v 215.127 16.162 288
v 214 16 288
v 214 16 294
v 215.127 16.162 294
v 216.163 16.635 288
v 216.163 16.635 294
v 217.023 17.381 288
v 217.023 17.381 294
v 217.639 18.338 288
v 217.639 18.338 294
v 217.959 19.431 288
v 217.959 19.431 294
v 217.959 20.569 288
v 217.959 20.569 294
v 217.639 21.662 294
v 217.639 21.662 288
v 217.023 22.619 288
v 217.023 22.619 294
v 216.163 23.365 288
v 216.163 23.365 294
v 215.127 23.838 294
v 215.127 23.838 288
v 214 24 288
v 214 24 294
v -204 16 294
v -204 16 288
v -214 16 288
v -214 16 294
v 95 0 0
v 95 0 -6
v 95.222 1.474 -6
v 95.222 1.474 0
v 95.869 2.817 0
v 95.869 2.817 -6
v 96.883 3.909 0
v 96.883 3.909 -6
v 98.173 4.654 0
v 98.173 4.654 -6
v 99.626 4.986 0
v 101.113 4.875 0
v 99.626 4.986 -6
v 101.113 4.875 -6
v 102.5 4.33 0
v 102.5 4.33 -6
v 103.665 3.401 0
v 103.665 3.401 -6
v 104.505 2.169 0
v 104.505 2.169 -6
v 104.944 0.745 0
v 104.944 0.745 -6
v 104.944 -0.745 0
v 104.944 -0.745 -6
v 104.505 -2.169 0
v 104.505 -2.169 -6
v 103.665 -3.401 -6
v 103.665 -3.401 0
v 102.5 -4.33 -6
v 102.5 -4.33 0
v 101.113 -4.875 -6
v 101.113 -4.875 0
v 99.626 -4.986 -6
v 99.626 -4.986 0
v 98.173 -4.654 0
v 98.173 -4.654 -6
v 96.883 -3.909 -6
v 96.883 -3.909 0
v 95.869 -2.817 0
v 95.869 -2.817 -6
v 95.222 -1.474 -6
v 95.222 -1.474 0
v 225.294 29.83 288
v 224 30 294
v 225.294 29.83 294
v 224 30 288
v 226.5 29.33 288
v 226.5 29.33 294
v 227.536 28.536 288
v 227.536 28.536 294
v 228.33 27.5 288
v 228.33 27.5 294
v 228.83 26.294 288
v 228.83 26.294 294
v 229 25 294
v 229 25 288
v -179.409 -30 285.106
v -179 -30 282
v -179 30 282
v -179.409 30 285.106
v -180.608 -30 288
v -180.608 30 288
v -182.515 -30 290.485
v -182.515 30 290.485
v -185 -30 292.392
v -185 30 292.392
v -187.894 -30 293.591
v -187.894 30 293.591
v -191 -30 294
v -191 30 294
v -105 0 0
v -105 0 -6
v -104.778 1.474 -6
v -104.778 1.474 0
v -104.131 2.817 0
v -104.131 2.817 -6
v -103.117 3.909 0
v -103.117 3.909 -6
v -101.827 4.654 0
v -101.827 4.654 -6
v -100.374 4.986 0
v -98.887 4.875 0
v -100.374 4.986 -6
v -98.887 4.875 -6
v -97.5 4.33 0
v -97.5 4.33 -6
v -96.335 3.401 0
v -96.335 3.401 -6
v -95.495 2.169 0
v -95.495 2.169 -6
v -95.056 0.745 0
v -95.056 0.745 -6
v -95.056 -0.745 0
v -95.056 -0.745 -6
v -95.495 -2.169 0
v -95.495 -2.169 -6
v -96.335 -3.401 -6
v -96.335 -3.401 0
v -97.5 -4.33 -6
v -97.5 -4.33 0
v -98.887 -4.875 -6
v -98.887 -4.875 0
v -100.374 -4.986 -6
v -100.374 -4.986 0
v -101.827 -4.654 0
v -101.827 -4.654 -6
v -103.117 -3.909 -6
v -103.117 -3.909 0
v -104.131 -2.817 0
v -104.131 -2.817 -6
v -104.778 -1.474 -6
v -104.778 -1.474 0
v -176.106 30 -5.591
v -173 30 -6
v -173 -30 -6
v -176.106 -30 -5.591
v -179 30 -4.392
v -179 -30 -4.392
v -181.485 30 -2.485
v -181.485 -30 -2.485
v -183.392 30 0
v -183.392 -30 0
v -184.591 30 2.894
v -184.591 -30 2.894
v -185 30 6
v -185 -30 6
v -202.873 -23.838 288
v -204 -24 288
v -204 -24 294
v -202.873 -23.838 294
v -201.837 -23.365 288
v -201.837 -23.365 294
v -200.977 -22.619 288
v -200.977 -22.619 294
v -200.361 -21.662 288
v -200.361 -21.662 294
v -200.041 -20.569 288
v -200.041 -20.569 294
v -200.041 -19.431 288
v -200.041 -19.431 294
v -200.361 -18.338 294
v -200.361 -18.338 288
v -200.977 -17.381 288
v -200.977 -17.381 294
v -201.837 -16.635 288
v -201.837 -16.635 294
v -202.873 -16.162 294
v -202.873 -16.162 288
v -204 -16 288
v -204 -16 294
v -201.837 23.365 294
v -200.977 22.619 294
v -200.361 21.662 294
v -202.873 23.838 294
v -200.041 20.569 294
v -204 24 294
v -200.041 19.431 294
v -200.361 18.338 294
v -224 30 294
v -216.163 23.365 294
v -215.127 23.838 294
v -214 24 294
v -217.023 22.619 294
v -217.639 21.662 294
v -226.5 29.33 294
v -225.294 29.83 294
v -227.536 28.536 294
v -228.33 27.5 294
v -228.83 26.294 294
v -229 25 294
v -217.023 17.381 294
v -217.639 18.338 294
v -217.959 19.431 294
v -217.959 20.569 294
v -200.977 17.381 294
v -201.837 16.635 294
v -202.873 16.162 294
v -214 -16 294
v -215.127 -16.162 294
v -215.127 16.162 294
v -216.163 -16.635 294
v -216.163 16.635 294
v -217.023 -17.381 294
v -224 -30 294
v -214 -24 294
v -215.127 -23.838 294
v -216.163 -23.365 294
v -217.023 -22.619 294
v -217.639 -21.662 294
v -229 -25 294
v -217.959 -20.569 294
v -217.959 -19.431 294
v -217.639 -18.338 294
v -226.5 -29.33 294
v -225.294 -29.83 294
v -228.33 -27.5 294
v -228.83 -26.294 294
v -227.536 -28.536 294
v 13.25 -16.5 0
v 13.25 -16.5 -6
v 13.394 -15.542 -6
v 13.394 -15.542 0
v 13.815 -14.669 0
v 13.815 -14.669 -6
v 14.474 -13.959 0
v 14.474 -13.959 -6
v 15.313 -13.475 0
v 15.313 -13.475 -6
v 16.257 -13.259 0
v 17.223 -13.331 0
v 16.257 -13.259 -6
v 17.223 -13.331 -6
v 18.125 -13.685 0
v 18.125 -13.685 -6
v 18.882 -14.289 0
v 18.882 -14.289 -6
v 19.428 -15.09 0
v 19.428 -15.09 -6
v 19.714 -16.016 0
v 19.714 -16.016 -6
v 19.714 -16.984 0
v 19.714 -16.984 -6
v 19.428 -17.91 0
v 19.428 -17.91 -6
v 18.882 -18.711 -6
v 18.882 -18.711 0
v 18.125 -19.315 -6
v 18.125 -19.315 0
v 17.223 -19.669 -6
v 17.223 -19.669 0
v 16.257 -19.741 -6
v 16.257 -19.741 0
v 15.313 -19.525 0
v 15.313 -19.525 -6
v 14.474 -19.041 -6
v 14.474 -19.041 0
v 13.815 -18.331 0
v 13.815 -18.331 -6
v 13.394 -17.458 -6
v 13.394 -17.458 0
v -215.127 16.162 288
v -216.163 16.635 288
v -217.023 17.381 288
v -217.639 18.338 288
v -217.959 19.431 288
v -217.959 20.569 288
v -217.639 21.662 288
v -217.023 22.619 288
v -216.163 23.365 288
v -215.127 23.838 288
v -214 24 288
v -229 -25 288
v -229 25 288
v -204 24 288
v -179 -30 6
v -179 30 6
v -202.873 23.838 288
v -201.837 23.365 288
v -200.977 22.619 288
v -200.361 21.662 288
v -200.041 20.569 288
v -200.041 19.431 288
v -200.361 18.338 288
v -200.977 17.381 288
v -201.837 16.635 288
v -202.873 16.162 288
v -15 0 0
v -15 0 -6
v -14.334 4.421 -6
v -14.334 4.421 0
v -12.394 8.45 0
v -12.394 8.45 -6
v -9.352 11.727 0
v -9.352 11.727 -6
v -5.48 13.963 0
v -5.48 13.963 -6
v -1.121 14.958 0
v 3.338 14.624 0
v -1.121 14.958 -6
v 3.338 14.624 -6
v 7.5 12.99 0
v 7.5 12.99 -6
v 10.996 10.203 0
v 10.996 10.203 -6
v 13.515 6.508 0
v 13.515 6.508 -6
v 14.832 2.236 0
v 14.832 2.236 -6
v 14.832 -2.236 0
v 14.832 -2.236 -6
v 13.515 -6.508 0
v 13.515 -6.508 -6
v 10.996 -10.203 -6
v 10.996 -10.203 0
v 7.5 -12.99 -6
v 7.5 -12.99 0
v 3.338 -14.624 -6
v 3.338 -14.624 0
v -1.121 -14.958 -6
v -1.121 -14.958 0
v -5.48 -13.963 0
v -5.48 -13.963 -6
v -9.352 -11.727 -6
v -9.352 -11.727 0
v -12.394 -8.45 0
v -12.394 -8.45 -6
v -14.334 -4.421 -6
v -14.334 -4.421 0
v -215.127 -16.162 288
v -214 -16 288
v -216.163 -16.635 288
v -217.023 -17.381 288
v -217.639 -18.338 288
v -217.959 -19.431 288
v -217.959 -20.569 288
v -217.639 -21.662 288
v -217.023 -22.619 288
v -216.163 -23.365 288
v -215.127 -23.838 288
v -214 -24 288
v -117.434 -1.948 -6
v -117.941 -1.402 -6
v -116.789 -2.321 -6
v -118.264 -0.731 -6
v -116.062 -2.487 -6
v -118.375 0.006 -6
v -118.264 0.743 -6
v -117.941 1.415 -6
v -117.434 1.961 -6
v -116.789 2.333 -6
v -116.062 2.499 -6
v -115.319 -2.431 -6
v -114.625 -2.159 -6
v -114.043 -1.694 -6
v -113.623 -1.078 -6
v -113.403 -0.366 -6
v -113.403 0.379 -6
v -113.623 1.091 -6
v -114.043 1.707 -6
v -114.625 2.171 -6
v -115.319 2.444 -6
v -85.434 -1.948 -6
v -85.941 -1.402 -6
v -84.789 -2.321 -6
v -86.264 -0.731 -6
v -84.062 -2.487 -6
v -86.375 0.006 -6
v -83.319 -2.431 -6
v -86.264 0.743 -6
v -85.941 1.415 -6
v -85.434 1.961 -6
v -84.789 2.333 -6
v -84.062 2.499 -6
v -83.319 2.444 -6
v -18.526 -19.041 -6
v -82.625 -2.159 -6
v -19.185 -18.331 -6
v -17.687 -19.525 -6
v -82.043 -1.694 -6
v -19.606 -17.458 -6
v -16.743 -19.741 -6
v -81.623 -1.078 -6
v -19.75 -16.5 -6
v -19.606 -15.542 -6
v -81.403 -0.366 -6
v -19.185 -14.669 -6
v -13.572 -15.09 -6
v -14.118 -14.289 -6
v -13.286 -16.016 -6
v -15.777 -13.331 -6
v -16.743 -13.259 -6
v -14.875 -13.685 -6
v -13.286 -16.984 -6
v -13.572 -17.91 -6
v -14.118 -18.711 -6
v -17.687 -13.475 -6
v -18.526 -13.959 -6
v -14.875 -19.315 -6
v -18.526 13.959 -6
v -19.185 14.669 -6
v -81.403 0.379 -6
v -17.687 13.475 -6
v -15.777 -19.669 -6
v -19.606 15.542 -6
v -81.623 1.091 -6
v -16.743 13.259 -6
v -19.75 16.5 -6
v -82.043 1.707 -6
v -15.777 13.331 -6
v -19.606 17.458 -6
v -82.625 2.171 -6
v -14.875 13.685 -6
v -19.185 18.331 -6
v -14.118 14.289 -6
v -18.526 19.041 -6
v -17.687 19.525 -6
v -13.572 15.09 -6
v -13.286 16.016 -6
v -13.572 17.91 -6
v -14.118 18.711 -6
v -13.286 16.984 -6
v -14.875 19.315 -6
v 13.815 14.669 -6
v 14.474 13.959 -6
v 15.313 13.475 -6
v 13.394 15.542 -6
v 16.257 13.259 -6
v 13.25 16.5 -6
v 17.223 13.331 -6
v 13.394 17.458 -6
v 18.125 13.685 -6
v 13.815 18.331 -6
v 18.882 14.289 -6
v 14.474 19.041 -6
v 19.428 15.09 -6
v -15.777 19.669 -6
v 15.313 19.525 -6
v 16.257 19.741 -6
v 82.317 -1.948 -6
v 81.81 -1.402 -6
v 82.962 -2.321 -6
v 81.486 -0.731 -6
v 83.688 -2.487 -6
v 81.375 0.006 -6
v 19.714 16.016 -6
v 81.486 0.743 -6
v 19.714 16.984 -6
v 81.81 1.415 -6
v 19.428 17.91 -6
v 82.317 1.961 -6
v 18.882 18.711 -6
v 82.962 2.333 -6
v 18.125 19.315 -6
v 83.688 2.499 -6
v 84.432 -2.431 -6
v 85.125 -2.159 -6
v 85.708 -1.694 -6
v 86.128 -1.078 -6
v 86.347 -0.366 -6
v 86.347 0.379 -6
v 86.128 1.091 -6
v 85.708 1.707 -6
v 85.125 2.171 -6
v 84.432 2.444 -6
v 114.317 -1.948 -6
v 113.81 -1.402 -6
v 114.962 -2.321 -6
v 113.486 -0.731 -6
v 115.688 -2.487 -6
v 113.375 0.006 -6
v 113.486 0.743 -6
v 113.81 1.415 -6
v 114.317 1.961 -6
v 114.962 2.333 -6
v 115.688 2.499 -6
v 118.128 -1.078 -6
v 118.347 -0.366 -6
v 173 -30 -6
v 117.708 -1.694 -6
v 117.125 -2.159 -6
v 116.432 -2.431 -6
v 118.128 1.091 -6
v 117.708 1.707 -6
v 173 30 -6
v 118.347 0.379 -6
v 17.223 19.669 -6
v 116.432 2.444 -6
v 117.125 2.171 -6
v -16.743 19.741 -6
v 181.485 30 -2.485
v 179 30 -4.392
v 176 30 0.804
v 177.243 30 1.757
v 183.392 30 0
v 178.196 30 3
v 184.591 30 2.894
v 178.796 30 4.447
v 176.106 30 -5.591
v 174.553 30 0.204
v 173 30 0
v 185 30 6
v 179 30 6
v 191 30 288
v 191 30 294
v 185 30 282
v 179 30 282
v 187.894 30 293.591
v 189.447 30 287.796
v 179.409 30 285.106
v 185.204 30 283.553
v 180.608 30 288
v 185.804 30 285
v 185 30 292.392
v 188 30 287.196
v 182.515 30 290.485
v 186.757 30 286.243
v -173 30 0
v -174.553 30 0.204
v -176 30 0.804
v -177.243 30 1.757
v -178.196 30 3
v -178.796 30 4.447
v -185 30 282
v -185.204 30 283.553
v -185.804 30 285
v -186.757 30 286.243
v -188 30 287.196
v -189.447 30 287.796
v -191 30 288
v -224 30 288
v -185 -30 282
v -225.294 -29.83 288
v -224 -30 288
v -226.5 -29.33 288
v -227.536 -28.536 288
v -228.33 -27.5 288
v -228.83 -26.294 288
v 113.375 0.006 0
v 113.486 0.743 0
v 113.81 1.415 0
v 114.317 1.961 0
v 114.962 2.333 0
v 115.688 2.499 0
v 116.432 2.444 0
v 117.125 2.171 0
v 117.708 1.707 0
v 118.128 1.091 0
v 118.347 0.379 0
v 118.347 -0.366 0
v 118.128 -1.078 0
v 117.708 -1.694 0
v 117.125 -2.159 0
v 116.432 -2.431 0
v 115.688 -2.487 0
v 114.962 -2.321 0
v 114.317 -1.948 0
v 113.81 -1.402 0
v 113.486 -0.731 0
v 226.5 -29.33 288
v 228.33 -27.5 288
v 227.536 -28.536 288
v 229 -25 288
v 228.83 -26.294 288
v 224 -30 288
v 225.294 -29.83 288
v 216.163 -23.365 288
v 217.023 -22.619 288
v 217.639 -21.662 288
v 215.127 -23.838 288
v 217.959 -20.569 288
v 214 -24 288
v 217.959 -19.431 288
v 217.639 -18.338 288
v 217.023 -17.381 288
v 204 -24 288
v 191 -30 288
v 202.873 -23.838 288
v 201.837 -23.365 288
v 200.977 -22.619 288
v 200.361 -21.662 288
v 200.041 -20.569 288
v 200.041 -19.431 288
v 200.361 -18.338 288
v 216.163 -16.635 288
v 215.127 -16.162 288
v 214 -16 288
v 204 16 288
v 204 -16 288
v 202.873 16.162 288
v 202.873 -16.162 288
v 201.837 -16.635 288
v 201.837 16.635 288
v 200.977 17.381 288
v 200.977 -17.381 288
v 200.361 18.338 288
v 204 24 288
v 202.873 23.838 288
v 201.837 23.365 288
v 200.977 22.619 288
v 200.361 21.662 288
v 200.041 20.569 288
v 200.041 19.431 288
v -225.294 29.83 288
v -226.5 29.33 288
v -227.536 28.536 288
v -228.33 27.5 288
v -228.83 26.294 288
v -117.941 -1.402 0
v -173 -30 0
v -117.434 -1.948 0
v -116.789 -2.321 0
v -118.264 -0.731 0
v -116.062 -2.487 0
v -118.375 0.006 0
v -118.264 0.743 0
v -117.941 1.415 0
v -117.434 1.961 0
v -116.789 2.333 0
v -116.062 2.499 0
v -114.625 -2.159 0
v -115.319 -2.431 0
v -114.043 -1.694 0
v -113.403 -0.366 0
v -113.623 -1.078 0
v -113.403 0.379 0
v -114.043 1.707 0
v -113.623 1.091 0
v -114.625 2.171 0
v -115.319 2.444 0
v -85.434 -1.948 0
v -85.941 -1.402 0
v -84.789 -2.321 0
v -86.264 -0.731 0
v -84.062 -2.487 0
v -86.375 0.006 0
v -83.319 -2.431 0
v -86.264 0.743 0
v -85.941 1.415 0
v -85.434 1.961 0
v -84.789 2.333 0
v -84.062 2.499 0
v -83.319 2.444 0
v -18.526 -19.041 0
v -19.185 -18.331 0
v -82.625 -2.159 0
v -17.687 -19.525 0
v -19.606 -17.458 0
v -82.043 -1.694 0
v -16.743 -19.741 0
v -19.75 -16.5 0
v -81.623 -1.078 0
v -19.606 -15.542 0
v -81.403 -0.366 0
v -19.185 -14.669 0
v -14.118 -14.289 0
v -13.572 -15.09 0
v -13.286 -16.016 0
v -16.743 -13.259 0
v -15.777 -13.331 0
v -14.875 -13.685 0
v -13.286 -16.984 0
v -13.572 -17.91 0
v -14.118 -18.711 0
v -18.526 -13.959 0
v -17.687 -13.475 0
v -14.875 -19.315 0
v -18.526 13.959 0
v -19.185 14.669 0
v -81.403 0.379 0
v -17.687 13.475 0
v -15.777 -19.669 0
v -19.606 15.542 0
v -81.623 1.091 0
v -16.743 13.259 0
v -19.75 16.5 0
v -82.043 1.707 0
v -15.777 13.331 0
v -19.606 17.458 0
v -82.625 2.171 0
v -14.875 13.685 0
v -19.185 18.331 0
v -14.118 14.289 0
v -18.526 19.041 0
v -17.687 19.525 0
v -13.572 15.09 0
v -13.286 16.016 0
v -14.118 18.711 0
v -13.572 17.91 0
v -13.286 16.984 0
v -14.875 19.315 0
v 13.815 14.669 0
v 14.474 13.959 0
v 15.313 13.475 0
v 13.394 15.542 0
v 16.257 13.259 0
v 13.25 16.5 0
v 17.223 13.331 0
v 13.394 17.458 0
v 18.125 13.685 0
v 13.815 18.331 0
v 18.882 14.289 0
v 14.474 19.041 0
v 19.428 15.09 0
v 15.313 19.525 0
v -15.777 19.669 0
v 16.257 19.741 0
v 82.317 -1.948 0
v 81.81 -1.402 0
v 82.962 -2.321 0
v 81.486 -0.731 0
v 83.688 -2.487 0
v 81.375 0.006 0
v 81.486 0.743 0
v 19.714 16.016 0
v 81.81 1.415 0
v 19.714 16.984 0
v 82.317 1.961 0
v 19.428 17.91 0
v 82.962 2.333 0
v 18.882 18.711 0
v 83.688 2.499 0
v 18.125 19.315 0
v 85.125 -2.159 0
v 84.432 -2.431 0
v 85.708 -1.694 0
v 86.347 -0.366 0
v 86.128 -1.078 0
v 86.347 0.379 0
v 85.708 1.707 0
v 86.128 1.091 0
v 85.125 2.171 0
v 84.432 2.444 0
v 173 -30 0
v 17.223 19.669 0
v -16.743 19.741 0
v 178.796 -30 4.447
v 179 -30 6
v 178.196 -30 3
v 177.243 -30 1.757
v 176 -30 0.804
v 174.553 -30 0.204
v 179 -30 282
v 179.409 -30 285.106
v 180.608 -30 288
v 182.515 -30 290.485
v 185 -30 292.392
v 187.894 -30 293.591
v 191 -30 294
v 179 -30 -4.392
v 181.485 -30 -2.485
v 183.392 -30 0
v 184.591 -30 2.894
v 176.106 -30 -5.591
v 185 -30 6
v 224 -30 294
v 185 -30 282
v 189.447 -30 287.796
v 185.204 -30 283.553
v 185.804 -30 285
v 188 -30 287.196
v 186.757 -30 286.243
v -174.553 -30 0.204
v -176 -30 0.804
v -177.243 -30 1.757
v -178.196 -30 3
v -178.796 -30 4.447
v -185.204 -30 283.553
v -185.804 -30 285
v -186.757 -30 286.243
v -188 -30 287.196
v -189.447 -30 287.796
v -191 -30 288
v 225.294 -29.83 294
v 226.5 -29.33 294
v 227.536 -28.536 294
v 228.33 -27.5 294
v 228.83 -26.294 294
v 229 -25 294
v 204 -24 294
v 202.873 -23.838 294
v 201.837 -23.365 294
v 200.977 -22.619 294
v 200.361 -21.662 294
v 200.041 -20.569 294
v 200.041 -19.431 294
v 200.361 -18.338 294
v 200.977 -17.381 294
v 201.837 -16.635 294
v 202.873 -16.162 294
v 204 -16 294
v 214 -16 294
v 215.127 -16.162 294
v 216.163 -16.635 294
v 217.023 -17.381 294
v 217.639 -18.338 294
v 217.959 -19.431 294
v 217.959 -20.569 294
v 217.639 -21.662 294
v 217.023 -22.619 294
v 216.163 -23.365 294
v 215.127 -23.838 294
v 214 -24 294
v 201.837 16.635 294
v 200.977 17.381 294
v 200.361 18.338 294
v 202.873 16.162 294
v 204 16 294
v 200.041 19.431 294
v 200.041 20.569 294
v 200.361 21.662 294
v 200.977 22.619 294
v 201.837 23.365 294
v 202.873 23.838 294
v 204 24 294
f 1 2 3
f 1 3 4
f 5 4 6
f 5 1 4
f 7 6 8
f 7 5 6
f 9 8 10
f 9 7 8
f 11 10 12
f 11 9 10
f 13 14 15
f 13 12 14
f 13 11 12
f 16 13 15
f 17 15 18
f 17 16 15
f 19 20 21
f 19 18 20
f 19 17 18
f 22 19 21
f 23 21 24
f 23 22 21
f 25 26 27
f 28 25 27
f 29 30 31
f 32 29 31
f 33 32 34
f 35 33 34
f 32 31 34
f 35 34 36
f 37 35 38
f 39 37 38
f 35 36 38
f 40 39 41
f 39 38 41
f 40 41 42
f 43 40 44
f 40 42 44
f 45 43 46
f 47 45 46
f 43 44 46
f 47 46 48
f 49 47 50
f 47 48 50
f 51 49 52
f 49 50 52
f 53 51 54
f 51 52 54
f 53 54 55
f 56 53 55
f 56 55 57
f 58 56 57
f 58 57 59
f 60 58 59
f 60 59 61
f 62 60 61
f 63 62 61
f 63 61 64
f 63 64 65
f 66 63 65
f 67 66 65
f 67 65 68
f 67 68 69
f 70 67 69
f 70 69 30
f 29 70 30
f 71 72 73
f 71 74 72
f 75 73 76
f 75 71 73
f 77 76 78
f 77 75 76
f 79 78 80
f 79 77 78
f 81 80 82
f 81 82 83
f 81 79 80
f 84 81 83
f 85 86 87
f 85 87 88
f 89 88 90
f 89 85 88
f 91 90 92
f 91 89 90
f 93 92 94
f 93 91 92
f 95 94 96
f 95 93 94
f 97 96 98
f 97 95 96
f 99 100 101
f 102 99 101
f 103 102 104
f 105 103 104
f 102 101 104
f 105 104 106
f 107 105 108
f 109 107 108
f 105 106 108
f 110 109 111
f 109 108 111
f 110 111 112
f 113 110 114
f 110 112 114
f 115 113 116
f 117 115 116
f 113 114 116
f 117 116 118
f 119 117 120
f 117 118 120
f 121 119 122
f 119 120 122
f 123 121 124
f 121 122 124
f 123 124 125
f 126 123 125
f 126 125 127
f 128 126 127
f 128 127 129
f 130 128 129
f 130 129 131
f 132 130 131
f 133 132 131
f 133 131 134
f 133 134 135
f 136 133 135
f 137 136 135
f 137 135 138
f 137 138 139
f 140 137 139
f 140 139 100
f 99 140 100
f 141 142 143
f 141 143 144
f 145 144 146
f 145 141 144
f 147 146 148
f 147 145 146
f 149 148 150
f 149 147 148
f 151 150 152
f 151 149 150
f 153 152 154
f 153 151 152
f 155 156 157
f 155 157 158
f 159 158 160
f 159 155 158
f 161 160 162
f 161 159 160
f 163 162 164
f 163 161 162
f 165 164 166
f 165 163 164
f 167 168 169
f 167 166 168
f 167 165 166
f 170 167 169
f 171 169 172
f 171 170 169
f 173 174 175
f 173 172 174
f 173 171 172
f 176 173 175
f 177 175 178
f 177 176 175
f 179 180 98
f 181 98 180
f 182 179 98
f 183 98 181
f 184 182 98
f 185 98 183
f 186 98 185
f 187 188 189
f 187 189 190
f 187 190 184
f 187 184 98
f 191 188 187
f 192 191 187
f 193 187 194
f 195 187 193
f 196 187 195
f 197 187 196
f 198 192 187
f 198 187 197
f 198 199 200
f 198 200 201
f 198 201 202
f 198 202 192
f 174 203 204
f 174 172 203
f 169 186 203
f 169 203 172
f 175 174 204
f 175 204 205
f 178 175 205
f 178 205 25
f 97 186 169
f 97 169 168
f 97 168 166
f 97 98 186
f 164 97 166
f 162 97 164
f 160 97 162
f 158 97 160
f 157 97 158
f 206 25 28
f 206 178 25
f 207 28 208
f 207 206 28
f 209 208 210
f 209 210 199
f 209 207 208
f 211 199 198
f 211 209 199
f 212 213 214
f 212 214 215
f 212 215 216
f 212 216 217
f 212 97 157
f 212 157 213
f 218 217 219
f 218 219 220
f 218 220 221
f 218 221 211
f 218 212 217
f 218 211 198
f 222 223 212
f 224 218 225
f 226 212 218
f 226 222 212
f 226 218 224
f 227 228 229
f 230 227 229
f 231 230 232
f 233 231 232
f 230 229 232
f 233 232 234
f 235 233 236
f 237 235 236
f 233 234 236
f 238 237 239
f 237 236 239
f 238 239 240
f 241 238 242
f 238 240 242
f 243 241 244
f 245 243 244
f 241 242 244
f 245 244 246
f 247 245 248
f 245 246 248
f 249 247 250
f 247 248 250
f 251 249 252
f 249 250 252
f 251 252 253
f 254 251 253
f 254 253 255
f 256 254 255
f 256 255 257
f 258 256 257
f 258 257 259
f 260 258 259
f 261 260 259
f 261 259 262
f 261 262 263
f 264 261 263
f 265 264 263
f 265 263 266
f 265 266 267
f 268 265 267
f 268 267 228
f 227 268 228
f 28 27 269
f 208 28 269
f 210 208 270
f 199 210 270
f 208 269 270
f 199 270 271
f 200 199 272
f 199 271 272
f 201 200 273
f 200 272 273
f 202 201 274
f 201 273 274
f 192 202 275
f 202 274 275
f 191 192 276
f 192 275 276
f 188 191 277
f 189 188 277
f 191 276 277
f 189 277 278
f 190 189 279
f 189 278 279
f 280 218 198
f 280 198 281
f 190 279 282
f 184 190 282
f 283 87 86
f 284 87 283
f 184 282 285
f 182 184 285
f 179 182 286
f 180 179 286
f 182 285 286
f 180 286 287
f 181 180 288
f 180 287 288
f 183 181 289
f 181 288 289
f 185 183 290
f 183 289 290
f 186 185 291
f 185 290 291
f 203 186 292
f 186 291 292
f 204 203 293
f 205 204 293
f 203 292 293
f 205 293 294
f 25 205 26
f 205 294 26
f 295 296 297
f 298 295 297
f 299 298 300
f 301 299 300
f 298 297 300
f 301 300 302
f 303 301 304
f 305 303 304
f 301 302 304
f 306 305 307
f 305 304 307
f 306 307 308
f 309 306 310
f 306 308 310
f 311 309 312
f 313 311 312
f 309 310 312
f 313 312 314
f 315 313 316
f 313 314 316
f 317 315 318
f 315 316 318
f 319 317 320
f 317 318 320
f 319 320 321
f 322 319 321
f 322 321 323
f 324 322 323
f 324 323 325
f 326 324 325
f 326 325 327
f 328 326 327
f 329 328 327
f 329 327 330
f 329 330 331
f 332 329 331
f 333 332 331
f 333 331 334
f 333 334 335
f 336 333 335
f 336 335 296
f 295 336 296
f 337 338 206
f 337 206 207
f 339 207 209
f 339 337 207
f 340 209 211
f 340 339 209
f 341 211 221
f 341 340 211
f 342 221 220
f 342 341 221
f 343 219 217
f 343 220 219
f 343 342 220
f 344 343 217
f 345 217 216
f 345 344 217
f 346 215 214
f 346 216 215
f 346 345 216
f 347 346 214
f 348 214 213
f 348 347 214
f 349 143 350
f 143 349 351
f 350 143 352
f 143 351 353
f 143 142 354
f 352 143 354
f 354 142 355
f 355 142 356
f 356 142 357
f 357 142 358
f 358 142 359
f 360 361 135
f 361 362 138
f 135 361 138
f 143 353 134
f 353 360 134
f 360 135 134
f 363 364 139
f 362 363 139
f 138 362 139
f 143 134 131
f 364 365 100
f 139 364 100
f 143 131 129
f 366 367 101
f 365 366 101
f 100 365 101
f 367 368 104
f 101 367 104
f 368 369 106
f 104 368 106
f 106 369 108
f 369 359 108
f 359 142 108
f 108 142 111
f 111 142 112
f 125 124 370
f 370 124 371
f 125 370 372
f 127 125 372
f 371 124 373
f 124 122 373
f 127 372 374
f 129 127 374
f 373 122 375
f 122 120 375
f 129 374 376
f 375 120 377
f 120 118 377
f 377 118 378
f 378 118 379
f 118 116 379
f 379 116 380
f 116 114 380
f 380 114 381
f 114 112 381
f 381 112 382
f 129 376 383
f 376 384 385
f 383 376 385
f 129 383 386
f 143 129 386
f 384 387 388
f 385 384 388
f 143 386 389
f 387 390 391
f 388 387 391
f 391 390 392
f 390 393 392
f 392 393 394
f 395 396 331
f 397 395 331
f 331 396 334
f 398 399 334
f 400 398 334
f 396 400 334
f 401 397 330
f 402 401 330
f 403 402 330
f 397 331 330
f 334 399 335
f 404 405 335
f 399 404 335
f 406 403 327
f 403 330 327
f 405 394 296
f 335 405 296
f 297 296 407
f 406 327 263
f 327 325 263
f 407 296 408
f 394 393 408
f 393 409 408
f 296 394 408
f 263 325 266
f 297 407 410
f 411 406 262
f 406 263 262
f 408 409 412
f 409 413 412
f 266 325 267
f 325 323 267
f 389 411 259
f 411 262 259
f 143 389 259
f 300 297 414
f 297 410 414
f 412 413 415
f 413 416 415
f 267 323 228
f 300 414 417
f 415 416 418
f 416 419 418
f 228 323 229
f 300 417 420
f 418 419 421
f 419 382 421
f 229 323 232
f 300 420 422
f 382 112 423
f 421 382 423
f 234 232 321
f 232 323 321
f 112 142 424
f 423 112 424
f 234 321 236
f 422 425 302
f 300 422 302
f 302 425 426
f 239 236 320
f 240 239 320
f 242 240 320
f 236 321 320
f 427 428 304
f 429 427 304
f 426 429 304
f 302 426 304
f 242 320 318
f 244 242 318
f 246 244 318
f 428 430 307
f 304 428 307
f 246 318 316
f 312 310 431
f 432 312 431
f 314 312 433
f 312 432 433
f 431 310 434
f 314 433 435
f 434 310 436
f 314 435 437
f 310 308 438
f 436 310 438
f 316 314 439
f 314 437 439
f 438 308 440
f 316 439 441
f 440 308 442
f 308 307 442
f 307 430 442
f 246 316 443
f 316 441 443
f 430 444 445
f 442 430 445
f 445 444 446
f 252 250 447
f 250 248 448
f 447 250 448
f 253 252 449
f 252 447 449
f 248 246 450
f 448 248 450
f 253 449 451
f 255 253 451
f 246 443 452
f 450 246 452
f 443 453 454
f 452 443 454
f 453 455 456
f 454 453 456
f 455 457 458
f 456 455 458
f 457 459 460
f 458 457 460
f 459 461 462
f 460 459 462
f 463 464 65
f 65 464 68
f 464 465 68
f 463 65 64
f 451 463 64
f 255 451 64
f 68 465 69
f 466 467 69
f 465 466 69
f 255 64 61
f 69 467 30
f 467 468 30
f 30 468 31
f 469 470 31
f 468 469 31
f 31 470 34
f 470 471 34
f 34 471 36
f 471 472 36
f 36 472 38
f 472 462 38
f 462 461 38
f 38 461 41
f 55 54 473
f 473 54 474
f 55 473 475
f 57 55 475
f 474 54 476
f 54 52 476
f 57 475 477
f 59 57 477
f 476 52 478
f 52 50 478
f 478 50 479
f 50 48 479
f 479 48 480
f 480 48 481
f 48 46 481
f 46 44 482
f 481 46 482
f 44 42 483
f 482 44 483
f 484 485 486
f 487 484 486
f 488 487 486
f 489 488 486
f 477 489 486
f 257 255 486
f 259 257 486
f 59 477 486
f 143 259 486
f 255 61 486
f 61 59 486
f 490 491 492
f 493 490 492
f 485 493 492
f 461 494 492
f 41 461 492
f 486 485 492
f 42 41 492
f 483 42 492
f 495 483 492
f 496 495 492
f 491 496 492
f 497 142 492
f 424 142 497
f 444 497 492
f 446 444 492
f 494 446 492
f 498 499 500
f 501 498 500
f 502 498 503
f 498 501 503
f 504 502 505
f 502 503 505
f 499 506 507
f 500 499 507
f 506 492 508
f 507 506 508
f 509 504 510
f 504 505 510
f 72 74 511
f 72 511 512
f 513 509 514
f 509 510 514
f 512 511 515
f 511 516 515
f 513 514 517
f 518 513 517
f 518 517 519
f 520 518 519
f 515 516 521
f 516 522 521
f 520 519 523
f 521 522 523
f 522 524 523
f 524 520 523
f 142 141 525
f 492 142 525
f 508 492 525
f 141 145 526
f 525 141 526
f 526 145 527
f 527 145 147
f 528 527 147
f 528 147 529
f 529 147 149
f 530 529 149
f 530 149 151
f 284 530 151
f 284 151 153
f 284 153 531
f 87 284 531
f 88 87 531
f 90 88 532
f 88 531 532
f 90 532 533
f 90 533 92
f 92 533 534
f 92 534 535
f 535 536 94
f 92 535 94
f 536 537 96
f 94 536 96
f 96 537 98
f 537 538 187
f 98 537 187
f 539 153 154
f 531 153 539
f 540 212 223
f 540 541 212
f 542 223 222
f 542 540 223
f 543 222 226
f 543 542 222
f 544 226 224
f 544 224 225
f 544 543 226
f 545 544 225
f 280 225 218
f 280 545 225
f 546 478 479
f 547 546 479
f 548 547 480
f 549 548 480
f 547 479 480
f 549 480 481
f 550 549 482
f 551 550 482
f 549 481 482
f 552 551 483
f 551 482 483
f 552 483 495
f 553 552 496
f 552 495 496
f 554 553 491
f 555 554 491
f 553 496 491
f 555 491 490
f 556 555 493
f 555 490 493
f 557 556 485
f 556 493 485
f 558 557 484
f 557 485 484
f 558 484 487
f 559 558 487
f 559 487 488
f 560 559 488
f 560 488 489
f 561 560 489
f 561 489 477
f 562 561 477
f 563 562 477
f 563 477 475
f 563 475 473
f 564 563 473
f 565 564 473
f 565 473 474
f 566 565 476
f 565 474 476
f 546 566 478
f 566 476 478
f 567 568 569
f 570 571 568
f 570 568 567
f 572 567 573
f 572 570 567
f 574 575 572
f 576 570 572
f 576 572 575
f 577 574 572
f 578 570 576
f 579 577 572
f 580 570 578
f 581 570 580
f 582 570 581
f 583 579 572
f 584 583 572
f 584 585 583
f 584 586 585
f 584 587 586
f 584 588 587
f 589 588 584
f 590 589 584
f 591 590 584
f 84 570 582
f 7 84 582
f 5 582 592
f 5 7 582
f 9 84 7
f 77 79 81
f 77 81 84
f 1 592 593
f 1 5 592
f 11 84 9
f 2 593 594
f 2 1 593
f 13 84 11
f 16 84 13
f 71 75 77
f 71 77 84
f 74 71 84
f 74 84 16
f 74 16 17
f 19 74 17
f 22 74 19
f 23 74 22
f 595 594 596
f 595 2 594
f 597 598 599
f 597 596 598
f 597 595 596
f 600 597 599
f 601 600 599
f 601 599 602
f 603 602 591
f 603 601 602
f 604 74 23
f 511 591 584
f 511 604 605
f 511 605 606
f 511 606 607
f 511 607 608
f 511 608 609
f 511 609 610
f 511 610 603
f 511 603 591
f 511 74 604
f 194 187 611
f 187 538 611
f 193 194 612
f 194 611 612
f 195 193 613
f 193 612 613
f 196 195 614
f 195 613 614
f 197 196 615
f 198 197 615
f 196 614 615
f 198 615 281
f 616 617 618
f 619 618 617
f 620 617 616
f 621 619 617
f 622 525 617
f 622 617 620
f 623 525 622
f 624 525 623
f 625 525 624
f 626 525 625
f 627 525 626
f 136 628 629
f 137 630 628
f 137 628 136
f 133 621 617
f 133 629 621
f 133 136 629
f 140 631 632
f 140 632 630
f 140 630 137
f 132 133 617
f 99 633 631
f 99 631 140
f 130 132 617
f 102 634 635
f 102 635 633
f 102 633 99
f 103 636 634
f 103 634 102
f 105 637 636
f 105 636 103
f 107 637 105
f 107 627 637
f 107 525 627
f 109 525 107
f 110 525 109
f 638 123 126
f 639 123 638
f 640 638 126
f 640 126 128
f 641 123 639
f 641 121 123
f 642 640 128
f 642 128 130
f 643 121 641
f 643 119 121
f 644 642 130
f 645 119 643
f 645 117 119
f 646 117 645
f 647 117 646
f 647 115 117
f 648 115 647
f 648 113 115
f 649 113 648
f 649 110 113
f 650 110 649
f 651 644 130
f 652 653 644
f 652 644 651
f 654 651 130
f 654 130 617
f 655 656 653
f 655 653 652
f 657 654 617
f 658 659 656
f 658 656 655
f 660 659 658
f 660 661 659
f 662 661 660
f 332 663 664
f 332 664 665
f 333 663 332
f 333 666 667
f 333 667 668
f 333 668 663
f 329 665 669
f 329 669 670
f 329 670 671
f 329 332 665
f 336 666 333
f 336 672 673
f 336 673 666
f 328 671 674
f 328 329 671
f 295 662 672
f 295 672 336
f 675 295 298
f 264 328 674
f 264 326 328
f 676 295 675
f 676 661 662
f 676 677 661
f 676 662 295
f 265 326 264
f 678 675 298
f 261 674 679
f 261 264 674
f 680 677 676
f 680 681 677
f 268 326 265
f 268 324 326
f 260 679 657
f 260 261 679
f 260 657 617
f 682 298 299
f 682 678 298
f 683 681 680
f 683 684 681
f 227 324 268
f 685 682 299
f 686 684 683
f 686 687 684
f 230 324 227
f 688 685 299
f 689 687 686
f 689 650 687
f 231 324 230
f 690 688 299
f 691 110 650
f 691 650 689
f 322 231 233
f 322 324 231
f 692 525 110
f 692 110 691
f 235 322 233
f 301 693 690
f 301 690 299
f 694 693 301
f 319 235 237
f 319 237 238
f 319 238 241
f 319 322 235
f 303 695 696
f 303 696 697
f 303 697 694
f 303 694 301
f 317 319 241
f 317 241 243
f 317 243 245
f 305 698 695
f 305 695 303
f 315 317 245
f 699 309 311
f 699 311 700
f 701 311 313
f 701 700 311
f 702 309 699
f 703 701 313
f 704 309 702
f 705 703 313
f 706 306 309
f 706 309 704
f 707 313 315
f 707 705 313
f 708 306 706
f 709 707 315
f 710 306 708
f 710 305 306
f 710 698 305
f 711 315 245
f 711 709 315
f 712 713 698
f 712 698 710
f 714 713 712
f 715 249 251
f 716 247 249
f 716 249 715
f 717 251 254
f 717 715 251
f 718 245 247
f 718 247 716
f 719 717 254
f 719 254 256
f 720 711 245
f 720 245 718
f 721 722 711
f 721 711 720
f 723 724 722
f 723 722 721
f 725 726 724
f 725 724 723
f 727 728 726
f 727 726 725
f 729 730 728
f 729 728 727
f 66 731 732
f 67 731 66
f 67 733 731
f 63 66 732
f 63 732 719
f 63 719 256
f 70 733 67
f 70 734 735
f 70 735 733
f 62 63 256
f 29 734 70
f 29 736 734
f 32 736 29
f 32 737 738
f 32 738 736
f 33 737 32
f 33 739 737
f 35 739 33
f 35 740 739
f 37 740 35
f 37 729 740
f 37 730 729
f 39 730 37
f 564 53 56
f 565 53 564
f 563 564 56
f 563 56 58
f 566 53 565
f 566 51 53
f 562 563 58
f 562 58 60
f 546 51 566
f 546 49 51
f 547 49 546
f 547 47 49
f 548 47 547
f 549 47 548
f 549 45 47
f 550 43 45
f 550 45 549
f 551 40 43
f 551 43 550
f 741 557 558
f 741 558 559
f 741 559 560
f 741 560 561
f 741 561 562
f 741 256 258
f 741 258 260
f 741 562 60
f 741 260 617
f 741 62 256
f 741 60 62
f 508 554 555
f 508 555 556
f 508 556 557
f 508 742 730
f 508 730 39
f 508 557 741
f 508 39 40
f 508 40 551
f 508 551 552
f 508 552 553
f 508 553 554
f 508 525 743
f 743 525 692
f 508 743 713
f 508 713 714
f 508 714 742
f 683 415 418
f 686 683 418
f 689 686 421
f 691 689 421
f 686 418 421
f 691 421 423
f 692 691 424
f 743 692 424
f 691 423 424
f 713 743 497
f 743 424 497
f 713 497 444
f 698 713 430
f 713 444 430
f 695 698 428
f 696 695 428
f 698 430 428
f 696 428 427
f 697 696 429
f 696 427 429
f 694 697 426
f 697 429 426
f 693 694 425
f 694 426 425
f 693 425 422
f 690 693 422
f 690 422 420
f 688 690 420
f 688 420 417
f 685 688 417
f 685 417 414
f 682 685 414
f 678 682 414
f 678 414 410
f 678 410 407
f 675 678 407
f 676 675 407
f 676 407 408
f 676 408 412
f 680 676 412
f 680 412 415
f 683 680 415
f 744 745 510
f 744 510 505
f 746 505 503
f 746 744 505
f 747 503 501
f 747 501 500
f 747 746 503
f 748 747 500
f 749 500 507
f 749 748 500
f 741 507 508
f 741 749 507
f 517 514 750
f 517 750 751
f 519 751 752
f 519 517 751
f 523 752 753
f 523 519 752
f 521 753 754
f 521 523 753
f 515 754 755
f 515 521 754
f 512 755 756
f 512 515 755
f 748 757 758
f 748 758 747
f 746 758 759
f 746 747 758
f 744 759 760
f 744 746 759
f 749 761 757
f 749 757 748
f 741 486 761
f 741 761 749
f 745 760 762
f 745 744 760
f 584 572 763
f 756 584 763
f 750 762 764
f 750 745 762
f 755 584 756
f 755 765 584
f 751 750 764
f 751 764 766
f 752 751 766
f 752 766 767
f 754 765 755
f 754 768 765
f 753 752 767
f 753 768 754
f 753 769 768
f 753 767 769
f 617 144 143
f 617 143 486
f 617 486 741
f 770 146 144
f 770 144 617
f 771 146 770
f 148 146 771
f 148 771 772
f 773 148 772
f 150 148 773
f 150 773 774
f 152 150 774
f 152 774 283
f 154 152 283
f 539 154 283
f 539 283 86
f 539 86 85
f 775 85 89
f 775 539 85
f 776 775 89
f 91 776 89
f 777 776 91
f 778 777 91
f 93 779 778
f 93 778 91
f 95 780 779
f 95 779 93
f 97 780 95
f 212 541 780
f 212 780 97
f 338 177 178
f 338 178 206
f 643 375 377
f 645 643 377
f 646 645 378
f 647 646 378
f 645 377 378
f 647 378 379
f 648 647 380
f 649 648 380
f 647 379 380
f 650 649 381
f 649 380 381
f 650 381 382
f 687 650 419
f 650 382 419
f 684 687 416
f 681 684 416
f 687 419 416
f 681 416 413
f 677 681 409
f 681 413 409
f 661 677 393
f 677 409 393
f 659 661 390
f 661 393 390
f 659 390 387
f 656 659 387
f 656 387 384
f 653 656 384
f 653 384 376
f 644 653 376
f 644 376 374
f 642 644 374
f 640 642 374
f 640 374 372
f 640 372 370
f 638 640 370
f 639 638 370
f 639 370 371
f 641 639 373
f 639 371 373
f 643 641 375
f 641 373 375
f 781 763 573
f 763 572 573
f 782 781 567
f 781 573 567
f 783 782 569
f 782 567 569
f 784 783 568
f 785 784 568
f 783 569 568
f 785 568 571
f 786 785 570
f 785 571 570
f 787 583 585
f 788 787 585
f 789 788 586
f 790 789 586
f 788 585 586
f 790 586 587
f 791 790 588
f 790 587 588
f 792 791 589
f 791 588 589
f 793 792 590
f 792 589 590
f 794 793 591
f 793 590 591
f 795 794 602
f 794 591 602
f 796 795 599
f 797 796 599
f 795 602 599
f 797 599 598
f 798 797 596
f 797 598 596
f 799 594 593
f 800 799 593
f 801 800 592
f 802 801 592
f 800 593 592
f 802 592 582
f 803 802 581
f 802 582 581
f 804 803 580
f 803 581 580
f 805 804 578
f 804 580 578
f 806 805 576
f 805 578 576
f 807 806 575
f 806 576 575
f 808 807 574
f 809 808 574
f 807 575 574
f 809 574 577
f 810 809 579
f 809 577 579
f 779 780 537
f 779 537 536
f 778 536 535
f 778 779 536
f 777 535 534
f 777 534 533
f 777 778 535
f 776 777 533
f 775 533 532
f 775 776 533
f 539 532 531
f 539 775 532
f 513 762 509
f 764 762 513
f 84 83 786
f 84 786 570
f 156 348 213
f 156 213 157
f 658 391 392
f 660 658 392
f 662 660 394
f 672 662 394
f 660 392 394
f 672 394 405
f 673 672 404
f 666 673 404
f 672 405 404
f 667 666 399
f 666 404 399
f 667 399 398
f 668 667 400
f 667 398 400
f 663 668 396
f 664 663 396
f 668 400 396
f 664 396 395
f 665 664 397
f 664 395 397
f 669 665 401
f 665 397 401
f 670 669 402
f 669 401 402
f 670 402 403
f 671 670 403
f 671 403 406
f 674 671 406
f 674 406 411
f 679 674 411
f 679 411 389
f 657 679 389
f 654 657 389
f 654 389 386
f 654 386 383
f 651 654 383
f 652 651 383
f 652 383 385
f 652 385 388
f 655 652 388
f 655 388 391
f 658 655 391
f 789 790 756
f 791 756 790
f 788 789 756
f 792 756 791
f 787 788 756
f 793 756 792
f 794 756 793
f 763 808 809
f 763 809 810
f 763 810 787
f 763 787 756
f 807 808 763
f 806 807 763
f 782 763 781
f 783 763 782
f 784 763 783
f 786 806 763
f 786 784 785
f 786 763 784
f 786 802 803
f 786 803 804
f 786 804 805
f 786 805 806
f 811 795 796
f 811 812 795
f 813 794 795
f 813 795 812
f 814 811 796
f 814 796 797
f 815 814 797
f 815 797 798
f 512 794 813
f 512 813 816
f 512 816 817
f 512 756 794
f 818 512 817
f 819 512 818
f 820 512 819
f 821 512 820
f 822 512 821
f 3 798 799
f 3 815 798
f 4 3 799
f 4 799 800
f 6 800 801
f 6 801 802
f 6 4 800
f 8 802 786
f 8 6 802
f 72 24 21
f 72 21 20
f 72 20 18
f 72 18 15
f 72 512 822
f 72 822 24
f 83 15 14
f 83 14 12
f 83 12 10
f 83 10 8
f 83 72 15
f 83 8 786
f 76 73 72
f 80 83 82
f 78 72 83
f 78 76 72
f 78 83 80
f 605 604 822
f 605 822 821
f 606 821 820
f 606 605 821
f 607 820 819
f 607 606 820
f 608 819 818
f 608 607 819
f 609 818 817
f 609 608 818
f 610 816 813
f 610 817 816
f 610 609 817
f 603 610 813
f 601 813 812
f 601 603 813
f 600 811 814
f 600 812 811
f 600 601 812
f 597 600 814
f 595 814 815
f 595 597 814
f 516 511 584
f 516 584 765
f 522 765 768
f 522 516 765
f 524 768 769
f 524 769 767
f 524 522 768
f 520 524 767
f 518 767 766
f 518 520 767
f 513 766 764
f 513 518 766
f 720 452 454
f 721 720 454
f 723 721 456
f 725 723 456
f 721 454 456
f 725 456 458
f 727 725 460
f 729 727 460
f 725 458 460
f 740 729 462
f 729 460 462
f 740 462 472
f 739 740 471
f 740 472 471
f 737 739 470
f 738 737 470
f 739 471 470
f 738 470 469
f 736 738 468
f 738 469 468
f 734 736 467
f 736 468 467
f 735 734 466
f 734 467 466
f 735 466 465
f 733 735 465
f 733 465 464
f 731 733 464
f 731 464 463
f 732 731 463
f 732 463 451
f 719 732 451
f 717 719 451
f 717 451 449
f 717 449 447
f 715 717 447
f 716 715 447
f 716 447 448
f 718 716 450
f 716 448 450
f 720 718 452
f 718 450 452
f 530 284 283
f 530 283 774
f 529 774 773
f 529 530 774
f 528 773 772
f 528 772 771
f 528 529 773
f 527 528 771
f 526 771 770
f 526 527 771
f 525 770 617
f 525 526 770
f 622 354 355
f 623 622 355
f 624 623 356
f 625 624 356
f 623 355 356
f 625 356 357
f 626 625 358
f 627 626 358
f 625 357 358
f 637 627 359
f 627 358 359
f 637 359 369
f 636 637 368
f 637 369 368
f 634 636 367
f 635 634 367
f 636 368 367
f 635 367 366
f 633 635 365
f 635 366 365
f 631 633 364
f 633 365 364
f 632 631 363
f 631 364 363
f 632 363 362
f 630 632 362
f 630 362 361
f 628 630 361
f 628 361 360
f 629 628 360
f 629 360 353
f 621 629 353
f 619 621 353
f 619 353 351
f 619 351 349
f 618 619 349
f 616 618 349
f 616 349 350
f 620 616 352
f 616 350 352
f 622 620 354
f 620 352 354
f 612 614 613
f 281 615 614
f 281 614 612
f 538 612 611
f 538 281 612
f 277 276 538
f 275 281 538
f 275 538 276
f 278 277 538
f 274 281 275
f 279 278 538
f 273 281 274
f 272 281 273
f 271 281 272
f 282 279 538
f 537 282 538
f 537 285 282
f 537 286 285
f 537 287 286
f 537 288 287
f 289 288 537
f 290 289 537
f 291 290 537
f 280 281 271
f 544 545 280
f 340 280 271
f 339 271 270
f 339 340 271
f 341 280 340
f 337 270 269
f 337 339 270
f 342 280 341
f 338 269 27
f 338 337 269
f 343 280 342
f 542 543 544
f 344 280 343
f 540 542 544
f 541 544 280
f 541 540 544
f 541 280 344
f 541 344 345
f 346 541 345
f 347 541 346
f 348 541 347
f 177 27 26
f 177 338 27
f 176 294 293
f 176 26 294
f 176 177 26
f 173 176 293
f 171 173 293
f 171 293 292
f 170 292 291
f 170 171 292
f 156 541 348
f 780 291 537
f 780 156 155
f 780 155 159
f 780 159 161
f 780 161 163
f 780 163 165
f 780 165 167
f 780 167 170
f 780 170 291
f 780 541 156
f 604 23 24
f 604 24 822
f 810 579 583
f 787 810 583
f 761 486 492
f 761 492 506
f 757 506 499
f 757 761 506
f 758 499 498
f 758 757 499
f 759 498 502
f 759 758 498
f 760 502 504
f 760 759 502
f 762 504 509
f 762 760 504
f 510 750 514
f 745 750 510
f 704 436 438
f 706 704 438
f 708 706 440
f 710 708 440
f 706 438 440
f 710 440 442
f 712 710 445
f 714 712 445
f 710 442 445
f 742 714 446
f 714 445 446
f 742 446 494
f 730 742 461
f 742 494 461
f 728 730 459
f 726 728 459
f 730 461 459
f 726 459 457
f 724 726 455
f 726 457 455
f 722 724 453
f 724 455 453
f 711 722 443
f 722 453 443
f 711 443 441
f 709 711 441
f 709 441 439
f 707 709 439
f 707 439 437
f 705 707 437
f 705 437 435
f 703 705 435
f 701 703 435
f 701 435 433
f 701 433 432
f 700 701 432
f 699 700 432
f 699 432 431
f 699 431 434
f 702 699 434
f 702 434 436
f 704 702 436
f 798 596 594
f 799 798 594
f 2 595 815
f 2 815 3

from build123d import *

# Parameters (mm, degrees)
SKETCH1_W                    = 370
SKETCH1_H                    = 60
BASE_FLANGE1_DEPTH           = 6
EDGE_FLANGE1_STRIP_W         = 36
EDGE_FLANGE1_STRIP_H         = 6
EDGE_FLANGE1_STRIP_CUT_DEPTH = 60
EDGE_FLANGE1_DEPTH           = 60
EDGE_FLANGE2_STRIP_W         = 36
EDGE_FLANGE2_STRIP_H         = 6
EDGE_FLANGE2_STRIP_CUT_DEPTH = 60
EDGE_FLANGE2_DEPTH           = 60
EDGE_FLANGE3_STRIP_W         = 36
EDGE_FLANGE3_STRIP_H         = 6
EDGE_FLANGE3_STRIP_CUT_DEPTH = 60
EDGE_FLANGE3_DEPTH           = 60
EDGE_FLANGE4_STRIP_W         = 36
EDGE_FLANGE4_STRIP_H         = 6
EDGE_FLANGE4_STRIP_CUT_DEPTH = 60
EDGE_FLANGE4_DEPTH           = 60
SKETCH18_R                   = 15
SKETCH18_R_2                 = 5
SKETCH18_R_3                 = 3.25
CUT_EXTRUDE1_DEPTH           = 65
CUT_EXTRUDE2_DEPTH           = 65
SKETCH23_R                   = 2.5
CUT_EXTRUDE3_DEPTH           = 6
FILLET1_R                    = 5


# Sheet-metal steps are written as plain solids
with BuildPart() as part:
    # Sketch1 → Base-Flange1 (new body)
    with BuildSketch(Plane.XY):
        Rectangle(SKETCH1_W, SKETCH1_H)
    extrude(amount=-BASE_FLANGE1_DEPTH)

    # Edge-Flange1 strip (across the edge) → Edge-Flange1 strip cut (cut)
    with BuildSketch(Plane(origin=(185, -30, 0), x_dir=(-1, 0, 0), z_dir=(0, 1, 0))):
        with Locations((-6, -3)):
            Rectangle(EDGE_FLANGE1_STRIP_W, EDGE_FLANGE1_STRIP_H)
    extrude(amount=EDGE_FLANGE1_STRIP_CUT_DEPTH, mode=Mode.SUBTRACT)

    # Edge-Flange1 section (across the edge) → Edge-Flange1 (add)
    with BuildSketch(Plane(origin=(185, -30, 0), x_dir=(-1, 0, 0), z_dir=(0, 1, 0))):
        with BuildLine():
            Line((0, 6), (0, 294))
            Line((0, 294), (6, 294))
            Line((6, 294), (6, 6))
            ThreePointArc((6, 6), (7.757359313, 1.757359313), (12, 0))
            Line((12, 0), (12, -6))
            ThreePointArc((12, -6), (3.514718626, -2.485281374), (0, 6))
        make_face()
    extrude(amount=EDGE_FLANGE1_DEPTH)

    # Edge-Flange2 strip (across the edge) → Edge-Flange2 strip cut (cut)
    with BuildSketch(Plane(origin=(-185, 30, 0), x_dir=(1, 0, 0), z_dir=(0, -1, 0))):
        with Locations((-6, -3)):
            Rectangle(EDGE_FLANGE2_STRIP_W, EDGE_FLANGE2_STRIP_H)
    extrude(amount=EDGE_FLANGE2_STRIP_CUT_DEPTH, mode=Mode.SUBTRACT)

    # Edge-Flange2 section (across the edge) → Edge-Flange2 (add)
    with BuildSketch(Plane(origin=(-185, 30, 0), x_dir=(1, 0, 0), z_dir=(0, -1, 0))):
        with BuildLine():
            Line((0, 6), (0, 294))
            Line((0, 294), (6, 294))
            Line((6, 294), (6, 6))
            ThreePointArc((6, 6), (7.757359313, 1.757359313), (12, 0))
            Line((12, 0), (12, -6))
            ThreePointArc((12, -6), (3.514718626, -2.485281374), (0, 6))
        make_face()
    extrude(amount=EDGE_FLANGE2_DEPTH)

    # Edge-Flange3 strip (across the edge) → Edge-Flange3 strip cut (cut)
    with BuildSketch(Plane(origin=(185, 30, 294), x_dir=(0, 0, -1), z_dir=(0, -1, 0))):
        with Locations((-6, -3)):
            Rectangle(EDGE_FLANGE3_STRIP_W, EDGE_FLANGE3_STRIP_H)
    extrude(amount=EDGE_FLANGE3_STRIP_CUT_DEPTH, mode=Mode.SUBTRACT)

    # Edge-Flange3 section (across the edge) → Edge-Flange3 (add)
    with BuildSketch(Plane(origin=(185, 30, 294), x_dir=(0, 0, -1), z_dir=(0, -1, 0))):
        with BuildLine():
            Line((0, 6), (0, 44))
            Line((0, 44), (6, 44))
            Line((6, 44), (6, 6))
            ThreePointArc((6, 6), (7.757359313, 1.757359313), (12, 0))
            Line((12, 0), (12, -6))
            ThreePointArc((12, -6), (3.514718626, -2.485281374), (0, 6))
        make_face()
    extrude(amount=EDGE_FLANGE3_DEPTH)

    # Edge-Flange4 strip (across the edge) → Edge-Flange4 strip cut (cut)
    with BuildSketch(Plane(origin=(-185, -30, 294), x_dir=(0, 0, -1), z_dir=(0, 1, 0))):
        with Locations((-6, -3)):
            Rectangle(EDGE_FLANGE4_STRIP_W, EDGE_FLANGE4_STRIP_H)
    extrude(amount=EDGE_FLANGE4_STRIP_CUT_DEPTH, mode=Mode.SUBTRACT)

    # Edge-Flange4 section (across the edge) → Edge-Flange4 (add)
    with BuildSketch(Plane(origin=(-185, -30, 294), x_dir=(0, 0, -1), z_dir=(0, 1, 0))):
        with BuildLine():
            Line((0, 6), (0, 44))
            Line((0, 44), (6, 44))
            Line((6, 44), (6, 6))
            ThreePointArc((6, 6), (7.757359313, 1.757359313), (12, 0))
            Line((12, 0), (12, -6))
            ThreePointArc((12, -6), (3.514718626, -2.485281374), (0, 6))
        make_face()
    extrude(amount=EDGE_FLANGE4_DEPTH)

    # Sketch18 → Cut-Extrude1 (cut)
    with BuildSketch(Plane(origin=(0, 0, -6), x_dir=(-1, 0, 0), z_dir=(0, 0, -1))):
        Circle(SKETCH18_R)
        with Locations((-100, 0)):
            Circle(SKETCH18_R_2)
        with Locations((100, 0)):
            Circle(SKETCH18_R_2)
        with Locations((-16.5, 16.5)):
            Circle(SKETCH18_R_3)
        with Locations((16.5, 16.5)):
            Circle(SKETCH18_R_3)
        with Locations((16.5, -16.5)):
            Circle(SKETCH18_R_3)
        with Locations((-16.5, -16.5)):
            Circle(SKETCH18_R_3)
    extrude(amount=-CUT_EXTRUDE1_DEPTH, mode=Mode.SUBTRACT)

    # Sketch22 → Cut-Extrude2 (cut)
    with BuildSketch(Plane(origin=(0, 0, 288), x_dir=(-1, 0, 0), z_dir=(0, 0, -1))):
        with BuildLine():
            Line((-204, 16), (-214, 16))
            ThreePointArc((-214, 16), (-218, 20), (-214, 24))
            Line((-214, 24), (-204, 24))
            ThreePointArc((-204, 24), (-200, 20), (-204, 16))
        make_face()
        with BuildLine():
            Line((-204, -16), (-214, -16))
            ThreePointArc((-214, -16), (-218, -20), (-214, -24))
            Line((-214, -24), (-204, -24))
            ThreePointArc((-204, -24), (-200, -20), (-204, -16))
        make_face()
        with BuildLine():
            Line((204, 16), (214, 16))
            ThreePointArc((214, 16), (218, 20), (214, 24))
            Line((214, 24), (204, 24))
            ThreePointArc((204, 24), (200, 20), (204, 16))
        make_face()
        with BuildLine():
            Line((204, -16), (214, -16))
            ThreePointArc((214, -16), (218, -20), (214, -24))
            Line((214, -24), (204, -24))
            ThreePointArc((204, -24), (200, -20), (204, -16))
        make_face()
    extrude(amount=-CUT_EXTRUDE2_DEPTH, mode=Mode.SUBTRACT)

    # Sketch23 → Cut-Extrude3 (cut)
    with BuildSketch(Plane(origin=(0, 0, -6), x_dir=(-1, 0, 0), z_dir=(0, 0, -1))):
        with Locations((115.875233888, 0.006238306)):
            Circle(SKETCH23_R)
        with Locations((83.875233888, 0.006238306)):
            Circle(SKETCH23_R)
        with Locations((-115.875233888, 0.006238306)):
            Circle(SKETCH23_R)
        with Locations((-83.875233888, 0.006238306)):
            Circle(SKETCH23_R)
    extrude(amount=-CUT_EXTRUDE3_DEPTH, mode=Mode.SUBTRACT)

    # Fillet1
    fillet1_edges = [part.edges().sort_by_distance(p)[0] for p in [
        (229, 30, 291),
        (229, -30, 291),
        (-229, -30, 291),
        (-229, 30, 291),
    ]]
    fillet(fillet1_edges, radius=FILLET1_R)


solid = part.part
